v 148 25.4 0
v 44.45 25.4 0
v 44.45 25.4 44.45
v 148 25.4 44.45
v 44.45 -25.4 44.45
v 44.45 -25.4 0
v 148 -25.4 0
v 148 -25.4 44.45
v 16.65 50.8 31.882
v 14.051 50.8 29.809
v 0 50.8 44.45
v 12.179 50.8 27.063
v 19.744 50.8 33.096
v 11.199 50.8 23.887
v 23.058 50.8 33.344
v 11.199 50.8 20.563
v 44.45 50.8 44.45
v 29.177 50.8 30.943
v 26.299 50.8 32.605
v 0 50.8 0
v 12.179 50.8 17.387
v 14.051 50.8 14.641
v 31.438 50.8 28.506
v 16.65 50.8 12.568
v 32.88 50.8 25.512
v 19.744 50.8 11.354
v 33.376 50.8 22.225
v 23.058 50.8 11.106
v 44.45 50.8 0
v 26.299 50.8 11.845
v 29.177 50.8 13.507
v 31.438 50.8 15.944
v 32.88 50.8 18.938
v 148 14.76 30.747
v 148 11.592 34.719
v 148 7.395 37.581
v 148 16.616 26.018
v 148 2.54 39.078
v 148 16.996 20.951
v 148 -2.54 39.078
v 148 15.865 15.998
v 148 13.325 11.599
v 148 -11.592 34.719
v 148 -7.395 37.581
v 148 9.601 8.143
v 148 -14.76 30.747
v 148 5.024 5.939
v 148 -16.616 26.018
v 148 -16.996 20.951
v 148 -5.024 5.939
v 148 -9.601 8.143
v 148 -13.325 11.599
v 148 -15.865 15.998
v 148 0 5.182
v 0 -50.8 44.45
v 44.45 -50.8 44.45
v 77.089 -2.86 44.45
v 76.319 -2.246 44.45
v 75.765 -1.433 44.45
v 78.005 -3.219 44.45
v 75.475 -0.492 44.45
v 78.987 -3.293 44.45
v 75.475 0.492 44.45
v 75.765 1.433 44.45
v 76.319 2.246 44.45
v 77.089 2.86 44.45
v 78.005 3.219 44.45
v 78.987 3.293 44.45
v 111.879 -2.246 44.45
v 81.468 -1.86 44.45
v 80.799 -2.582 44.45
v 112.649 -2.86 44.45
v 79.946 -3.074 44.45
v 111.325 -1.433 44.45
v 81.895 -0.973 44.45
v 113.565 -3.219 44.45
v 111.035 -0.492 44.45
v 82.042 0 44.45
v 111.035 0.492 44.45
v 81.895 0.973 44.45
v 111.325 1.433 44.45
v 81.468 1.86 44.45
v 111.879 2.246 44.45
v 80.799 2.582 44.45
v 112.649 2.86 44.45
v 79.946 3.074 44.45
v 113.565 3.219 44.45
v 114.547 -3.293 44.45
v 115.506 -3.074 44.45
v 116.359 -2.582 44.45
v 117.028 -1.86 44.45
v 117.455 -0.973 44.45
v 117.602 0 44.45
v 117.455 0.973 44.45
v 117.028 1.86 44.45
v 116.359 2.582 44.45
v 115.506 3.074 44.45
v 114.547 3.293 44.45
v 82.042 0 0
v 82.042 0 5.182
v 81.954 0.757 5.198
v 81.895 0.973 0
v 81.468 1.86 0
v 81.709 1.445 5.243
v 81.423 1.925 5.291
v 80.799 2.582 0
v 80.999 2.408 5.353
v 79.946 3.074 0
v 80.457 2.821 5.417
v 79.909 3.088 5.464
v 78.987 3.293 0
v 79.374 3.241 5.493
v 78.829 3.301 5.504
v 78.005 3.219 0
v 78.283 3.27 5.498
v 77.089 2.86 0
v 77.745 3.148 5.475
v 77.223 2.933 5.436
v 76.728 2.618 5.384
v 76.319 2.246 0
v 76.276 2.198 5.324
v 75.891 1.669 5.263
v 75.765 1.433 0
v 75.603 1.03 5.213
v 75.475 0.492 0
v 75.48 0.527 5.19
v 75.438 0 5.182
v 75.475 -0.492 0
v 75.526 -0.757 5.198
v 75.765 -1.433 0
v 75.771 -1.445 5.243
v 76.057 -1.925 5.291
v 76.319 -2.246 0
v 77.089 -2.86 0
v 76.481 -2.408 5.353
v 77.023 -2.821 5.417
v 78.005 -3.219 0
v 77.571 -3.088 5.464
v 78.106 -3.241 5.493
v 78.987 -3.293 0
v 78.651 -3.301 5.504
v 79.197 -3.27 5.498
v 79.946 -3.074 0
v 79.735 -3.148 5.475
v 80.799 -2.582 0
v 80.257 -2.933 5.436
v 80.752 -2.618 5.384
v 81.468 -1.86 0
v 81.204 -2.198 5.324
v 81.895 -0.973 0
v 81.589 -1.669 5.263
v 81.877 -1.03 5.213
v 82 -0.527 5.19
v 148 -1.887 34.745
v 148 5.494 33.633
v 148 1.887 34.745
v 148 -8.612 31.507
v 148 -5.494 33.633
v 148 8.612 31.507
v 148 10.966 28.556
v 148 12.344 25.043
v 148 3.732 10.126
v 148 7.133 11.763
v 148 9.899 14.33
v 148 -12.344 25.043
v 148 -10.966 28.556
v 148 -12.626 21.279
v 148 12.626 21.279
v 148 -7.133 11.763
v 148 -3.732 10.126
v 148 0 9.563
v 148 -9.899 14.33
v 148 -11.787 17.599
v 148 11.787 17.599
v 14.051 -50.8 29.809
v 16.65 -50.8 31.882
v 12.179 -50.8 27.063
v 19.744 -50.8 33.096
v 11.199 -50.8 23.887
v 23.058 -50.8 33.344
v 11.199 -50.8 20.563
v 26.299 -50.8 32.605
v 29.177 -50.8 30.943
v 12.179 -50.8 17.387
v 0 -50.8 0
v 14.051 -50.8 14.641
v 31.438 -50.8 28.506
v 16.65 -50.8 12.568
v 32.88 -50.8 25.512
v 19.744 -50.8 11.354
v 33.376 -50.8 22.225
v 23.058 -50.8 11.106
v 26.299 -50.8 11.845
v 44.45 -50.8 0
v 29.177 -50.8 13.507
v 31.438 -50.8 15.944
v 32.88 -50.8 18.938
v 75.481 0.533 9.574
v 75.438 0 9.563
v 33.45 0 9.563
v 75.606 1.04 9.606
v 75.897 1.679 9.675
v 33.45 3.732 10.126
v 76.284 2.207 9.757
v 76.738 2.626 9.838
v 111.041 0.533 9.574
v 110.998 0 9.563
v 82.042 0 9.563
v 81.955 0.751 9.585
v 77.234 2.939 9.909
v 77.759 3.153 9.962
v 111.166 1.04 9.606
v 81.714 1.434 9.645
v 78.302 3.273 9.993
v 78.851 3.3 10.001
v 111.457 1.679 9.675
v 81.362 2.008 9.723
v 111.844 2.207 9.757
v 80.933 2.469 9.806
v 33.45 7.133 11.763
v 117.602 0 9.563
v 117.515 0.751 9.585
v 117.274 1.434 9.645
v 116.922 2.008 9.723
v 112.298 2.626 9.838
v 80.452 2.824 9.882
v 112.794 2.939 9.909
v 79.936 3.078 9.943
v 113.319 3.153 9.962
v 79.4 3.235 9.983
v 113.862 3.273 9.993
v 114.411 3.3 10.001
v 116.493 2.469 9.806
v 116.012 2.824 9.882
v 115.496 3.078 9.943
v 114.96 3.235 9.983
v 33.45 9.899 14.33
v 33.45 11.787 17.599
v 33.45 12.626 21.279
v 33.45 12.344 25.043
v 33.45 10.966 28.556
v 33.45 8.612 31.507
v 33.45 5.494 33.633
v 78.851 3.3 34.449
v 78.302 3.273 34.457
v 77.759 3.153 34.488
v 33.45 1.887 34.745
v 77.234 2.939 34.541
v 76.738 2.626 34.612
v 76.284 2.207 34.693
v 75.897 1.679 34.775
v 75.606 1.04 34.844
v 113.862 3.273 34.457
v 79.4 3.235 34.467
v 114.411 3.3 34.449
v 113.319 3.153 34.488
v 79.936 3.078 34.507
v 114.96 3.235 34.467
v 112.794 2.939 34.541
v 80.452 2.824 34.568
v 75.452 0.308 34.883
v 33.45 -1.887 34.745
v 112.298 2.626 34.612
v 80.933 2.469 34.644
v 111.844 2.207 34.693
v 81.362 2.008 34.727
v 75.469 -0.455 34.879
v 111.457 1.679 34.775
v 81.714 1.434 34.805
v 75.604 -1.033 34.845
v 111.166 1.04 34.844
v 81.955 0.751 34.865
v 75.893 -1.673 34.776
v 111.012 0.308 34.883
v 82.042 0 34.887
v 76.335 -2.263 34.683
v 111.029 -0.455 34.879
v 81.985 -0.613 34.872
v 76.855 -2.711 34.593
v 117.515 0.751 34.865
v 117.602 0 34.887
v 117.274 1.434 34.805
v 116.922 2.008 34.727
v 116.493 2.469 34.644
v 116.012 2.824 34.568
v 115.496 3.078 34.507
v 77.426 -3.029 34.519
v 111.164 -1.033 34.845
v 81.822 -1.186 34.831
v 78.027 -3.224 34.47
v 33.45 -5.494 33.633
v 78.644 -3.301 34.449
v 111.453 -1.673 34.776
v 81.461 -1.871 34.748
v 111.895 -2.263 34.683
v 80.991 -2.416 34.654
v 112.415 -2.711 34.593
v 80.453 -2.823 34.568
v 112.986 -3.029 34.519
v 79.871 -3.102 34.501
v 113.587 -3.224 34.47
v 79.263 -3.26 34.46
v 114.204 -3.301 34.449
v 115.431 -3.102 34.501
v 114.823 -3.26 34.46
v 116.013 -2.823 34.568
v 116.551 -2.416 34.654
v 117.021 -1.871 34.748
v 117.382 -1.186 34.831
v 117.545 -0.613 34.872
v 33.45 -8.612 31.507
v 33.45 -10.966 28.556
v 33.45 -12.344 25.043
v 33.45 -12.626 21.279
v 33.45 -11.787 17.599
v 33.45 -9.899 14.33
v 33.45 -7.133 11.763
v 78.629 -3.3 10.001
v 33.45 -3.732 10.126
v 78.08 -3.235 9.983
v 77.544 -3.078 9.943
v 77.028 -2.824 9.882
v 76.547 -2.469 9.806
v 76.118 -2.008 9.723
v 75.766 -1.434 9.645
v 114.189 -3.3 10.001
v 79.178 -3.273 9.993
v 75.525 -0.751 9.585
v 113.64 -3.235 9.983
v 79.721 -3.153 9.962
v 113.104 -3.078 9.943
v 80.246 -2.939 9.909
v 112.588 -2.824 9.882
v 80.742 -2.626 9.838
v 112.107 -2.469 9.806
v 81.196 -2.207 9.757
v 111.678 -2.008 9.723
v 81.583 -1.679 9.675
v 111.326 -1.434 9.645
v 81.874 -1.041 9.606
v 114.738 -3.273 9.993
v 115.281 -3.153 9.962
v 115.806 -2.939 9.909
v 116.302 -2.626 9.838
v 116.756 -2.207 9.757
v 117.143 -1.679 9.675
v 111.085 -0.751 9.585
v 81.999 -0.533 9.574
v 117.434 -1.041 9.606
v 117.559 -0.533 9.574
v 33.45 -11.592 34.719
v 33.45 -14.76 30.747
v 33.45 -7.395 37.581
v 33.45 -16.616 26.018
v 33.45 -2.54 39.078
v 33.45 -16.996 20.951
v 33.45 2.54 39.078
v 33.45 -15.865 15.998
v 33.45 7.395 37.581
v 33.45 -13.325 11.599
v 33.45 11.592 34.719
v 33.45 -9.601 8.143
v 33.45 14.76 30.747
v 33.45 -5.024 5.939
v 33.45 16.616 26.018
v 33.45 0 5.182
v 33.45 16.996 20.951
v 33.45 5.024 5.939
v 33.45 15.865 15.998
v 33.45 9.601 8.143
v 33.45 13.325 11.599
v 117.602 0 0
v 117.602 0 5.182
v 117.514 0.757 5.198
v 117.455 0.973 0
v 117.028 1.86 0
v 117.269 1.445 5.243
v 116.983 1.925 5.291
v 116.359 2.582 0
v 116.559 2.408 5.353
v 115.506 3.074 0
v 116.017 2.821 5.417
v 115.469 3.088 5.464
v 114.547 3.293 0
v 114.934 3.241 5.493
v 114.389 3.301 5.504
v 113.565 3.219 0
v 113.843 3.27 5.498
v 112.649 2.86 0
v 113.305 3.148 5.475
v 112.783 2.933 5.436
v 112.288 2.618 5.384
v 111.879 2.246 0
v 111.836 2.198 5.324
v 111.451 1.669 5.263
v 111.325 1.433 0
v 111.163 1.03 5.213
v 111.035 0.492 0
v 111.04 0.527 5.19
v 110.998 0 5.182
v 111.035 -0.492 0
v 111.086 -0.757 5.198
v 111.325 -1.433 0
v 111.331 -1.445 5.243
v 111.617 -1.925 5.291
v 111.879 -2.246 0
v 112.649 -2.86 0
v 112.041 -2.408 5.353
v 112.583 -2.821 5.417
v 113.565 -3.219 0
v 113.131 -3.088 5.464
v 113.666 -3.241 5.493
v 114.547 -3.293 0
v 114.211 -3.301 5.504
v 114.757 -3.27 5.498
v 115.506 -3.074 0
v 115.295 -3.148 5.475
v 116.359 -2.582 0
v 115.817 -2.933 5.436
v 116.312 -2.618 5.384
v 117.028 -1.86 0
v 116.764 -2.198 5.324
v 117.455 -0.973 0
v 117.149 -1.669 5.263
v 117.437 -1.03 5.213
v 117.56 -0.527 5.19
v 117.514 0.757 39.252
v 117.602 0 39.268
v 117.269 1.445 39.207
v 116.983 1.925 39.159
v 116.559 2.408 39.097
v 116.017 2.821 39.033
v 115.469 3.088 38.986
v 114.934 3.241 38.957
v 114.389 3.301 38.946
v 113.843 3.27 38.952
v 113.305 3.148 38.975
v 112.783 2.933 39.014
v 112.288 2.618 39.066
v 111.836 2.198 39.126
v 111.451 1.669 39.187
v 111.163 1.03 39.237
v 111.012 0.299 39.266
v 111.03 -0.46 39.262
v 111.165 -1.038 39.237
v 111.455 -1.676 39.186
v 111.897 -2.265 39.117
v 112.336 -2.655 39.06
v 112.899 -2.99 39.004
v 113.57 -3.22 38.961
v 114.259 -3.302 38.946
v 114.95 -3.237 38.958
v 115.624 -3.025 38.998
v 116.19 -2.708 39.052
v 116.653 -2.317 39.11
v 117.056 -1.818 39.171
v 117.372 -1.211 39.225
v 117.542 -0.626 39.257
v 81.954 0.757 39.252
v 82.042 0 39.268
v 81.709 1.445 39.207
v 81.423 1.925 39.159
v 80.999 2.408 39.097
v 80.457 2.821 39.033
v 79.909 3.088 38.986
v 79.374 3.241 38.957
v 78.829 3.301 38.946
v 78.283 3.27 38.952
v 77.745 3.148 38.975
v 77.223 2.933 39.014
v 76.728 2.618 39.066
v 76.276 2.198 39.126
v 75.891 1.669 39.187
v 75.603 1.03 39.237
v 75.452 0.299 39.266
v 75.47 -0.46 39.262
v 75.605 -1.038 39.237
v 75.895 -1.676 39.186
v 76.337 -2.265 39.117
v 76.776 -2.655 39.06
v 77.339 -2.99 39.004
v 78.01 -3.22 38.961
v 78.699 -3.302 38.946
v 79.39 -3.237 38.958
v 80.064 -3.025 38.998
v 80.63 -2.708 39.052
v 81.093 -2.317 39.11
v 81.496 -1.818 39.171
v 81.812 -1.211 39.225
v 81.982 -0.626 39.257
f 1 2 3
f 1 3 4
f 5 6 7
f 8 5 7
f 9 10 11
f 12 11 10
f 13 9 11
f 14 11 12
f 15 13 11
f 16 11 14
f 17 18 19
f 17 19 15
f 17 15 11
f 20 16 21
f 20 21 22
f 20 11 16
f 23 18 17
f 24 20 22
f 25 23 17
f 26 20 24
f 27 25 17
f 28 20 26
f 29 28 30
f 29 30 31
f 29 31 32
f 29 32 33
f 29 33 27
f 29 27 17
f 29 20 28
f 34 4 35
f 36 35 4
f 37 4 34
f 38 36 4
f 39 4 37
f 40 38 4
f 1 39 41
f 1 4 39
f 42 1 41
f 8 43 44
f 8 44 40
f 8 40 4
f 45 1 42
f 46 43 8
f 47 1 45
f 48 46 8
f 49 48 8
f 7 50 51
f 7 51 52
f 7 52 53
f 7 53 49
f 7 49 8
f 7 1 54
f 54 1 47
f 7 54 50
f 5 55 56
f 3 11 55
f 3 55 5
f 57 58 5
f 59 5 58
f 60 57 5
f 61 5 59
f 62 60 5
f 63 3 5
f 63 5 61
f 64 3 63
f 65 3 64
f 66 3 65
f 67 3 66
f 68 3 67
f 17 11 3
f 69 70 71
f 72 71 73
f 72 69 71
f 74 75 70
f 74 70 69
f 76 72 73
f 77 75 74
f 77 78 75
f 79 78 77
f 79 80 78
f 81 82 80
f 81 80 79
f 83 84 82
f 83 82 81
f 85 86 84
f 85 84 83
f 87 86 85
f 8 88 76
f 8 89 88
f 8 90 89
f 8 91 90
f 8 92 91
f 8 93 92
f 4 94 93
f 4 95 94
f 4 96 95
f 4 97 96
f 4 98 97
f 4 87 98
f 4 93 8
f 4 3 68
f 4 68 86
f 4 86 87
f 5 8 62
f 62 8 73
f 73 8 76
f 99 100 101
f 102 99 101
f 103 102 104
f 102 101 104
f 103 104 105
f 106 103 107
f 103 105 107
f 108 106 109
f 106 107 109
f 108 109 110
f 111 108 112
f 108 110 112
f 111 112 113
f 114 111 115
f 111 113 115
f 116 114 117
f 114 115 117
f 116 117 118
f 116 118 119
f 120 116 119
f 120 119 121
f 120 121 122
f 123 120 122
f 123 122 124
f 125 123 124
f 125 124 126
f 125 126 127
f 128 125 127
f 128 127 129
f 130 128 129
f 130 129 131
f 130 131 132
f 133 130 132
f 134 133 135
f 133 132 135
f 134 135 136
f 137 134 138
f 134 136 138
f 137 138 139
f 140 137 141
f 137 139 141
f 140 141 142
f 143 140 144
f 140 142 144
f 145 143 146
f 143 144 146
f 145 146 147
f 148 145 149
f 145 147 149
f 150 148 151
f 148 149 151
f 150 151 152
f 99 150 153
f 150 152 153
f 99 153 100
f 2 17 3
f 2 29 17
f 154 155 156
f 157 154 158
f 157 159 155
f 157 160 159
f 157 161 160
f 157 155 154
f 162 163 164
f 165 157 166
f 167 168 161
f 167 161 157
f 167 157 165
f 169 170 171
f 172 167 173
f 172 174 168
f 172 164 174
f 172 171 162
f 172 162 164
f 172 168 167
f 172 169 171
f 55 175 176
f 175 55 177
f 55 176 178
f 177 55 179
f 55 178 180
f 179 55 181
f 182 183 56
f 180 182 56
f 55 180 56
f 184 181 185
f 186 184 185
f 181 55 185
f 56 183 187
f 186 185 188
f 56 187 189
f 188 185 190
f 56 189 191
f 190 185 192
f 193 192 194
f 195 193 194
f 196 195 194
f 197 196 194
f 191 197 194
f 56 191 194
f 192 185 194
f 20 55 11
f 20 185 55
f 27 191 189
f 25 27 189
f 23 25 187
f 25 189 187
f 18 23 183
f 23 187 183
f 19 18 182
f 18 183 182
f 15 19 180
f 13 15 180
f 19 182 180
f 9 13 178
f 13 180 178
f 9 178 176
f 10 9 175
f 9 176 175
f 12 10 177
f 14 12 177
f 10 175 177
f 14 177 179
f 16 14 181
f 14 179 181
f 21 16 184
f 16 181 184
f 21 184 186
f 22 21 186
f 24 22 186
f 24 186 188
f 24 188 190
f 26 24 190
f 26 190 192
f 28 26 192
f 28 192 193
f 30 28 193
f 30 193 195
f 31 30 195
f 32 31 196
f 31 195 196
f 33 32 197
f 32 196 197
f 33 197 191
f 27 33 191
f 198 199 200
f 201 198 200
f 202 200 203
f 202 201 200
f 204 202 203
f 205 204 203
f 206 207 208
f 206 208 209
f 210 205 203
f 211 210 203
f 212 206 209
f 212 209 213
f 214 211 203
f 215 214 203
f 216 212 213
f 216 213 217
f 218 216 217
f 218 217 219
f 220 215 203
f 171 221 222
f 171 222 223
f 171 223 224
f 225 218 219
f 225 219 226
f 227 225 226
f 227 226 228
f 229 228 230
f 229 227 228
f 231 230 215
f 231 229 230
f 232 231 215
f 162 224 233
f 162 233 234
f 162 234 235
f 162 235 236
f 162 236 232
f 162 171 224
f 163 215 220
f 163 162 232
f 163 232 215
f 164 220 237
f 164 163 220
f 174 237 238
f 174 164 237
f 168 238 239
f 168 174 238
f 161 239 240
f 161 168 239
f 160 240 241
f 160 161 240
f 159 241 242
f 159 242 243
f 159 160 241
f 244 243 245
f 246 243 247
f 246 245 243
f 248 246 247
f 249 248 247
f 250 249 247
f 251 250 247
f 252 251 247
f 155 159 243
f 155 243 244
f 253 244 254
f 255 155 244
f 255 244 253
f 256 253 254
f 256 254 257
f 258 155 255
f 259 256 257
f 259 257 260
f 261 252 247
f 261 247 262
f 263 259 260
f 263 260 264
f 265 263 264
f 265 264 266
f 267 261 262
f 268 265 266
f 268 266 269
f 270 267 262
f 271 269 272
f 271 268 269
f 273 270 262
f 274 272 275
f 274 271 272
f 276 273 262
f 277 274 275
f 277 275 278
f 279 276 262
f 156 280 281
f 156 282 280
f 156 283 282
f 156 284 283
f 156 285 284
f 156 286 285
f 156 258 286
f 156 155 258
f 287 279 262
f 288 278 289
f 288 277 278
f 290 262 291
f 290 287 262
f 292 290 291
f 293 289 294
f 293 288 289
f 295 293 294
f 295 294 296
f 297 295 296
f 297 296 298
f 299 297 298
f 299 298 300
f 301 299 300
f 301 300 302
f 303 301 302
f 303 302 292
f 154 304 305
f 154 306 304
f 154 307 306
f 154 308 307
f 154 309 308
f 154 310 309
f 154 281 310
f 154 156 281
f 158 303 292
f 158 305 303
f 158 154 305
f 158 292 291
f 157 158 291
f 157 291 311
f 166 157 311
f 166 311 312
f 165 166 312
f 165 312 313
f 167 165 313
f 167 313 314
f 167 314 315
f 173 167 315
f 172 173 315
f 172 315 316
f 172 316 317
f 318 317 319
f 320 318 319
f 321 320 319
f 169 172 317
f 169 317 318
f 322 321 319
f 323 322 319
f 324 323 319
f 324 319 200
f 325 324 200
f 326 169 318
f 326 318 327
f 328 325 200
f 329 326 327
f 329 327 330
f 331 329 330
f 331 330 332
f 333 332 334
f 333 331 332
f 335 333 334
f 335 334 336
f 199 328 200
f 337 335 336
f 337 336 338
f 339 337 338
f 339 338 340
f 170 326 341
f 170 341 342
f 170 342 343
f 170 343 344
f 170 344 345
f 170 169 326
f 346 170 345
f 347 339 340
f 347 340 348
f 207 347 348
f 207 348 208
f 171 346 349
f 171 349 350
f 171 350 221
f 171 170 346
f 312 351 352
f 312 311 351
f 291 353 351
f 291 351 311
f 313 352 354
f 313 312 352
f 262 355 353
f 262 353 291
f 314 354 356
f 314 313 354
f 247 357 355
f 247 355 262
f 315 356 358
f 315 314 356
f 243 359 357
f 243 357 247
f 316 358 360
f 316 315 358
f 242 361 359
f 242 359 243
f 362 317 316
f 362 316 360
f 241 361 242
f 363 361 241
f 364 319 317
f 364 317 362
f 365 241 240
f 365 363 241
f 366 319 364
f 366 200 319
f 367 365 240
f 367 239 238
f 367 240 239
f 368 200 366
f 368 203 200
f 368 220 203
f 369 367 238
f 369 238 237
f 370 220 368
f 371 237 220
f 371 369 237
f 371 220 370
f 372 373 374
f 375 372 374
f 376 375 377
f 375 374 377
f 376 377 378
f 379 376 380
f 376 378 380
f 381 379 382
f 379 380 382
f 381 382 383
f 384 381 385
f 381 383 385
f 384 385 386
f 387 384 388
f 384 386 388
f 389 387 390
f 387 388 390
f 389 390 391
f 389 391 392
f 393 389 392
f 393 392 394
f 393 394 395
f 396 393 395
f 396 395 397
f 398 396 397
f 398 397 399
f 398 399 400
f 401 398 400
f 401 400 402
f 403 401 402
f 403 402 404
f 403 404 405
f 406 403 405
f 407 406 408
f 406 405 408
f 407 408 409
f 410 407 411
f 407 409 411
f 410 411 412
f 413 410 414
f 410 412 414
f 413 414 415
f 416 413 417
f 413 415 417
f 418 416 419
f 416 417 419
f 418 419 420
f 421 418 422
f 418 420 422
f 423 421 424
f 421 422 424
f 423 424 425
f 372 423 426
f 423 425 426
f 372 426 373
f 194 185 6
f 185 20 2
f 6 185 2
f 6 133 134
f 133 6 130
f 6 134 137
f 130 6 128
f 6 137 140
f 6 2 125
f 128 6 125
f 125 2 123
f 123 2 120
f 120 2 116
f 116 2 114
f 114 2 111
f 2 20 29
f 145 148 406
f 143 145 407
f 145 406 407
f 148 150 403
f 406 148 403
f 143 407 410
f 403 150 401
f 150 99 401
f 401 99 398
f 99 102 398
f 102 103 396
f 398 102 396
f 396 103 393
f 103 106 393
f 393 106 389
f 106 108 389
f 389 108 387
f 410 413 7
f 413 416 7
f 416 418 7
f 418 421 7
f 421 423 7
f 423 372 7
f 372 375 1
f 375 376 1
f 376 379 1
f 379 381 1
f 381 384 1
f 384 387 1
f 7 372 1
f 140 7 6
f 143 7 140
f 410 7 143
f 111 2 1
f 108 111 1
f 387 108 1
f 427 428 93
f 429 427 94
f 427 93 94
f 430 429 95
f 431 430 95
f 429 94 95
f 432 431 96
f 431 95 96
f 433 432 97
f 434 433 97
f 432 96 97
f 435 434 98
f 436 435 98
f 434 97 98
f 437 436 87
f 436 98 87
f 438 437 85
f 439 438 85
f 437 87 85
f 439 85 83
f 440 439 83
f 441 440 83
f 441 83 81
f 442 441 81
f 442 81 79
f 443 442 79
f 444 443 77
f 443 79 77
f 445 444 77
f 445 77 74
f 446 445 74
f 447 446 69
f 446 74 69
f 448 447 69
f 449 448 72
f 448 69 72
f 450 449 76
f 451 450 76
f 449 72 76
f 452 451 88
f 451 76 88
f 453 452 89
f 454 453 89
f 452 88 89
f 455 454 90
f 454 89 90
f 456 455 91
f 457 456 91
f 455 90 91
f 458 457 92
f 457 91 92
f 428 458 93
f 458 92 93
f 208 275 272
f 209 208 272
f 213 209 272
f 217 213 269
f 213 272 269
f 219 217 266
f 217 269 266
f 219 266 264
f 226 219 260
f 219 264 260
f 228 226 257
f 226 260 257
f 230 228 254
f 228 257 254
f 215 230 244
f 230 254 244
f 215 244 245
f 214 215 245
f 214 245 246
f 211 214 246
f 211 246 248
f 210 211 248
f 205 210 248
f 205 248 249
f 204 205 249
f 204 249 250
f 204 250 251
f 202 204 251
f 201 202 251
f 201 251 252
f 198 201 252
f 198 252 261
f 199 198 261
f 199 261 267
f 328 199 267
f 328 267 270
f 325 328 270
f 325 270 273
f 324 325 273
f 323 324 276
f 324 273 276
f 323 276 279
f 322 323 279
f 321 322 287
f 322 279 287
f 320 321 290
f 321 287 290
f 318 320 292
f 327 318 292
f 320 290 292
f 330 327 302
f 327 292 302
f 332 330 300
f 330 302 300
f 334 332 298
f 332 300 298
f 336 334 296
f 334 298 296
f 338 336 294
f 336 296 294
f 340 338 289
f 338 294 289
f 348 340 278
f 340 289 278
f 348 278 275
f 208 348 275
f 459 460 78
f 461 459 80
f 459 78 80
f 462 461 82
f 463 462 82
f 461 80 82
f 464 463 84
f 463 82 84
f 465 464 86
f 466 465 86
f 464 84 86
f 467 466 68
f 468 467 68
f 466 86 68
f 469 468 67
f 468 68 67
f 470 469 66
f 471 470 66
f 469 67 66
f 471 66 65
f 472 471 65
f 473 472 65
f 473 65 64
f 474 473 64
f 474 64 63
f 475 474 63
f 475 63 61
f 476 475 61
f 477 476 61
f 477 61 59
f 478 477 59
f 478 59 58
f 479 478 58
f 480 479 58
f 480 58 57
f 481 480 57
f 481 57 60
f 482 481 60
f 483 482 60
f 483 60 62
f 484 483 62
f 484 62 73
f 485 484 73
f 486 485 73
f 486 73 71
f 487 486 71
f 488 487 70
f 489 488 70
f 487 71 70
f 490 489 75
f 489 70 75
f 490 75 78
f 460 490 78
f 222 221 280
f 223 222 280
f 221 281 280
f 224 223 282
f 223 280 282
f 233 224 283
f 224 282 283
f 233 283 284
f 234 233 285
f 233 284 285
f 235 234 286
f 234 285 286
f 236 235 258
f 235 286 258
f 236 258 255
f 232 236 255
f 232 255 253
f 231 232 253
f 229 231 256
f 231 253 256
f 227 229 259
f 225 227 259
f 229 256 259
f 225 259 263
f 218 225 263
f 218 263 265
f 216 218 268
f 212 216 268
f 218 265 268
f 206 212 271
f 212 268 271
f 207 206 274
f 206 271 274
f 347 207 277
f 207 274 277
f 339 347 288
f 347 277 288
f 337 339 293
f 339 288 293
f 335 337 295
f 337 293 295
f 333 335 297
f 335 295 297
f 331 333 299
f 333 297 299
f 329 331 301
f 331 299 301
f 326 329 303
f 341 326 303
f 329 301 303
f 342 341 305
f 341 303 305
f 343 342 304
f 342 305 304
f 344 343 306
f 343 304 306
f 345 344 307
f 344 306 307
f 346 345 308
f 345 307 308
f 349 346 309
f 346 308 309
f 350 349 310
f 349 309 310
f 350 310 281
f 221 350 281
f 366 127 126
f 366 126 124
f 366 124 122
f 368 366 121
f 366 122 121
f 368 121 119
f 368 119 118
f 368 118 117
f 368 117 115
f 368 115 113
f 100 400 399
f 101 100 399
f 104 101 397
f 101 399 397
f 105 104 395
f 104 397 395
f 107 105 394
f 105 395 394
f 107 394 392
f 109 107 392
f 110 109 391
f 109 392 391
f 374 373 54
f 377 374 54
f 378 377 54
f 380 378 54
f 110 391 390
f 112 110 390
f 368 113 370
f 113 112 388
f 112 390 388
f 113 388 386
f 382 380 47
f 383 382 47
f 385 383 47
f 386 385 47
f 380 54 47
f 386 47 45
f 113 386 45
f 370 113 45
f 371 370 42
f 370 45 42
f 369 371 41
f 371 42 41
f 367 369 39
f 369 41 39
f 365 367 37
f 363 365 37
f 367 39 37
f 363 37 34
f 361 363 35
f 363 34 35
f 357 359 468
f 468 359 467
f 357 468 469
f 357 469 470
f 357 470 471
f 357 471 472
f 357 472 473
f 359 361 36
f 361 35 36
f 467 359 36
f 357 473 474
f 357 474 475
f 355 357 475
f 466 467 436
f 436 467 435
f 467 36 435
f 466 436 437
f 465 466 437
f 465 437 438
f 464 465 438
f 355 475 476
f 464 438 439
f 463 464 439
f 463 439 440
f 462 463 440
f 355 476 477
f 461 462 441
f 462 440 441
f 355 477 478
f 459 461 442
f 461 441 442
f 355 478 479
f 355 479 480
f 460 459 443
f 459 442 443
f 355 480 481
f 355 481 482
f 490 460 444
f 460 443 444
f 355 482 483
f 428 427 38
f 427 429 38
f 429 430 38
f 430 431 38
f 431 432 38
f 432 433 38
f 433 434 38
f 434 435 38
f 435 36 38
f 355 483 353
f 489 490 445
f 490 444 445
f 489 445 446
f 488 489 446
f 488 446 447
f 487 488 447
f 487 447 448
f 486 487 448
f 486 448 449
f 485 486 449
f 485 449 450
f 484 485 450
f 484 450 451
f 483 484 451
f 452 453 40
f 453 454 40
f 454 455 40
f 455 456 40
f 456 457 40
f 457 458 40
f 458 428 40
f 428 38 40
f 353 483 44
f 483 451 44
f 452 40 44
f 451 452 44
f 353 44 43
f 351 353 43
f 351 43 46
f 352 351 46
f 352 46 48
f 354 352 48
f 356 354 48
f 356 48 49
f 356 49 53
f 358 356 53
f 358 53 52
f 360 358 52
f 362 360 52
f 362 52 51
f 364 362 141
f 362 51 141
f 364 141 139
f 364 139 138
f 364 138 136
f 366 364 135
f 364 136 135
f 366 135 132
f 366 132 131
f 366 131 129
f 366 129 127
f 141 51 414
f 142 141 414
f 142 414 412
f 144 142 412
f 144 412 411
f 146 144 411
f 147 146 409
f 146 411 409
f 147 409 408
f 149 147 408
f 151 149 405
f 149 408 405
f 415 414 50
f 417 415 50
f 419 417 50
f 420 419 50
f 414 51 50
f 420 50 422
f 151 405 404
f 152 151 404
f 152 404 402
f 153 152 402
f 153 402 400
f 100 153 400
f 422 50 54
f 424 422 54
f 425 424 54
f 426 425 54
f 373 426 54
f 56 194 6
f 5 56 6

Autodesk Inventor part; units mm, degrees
ref_plane "YZ Plane" through (0, 0, 0) normal (1, 0, 0) x (0, 1, 0)
ref_plane "XZ Plane" through (0, 0, 0) normal (0, 1, 0) x (-1, 0, 0)
sketch "Base for Part" plane through (0, 0, 0) normal (0, 0, 1) x (1, 0, 0)
  line L0 (0, 0) -> (148, 0) construction
  line L1 (0, 0) -> (0, 50.8)
  line L2 (0, 50.8) -> (44.45, 50.8)
  line L3 (148, -29.2) -> (148, 0)
  line L4 (44.45, 50.8) -> (44.45, 25.4)
  line L5 (44.45, 25.4) -> (148, 25.4)
  line L6 (148, 25.4) -> (148, 0)
  line L7 (0, 0) -> (0, -50.8)
  line L8 (0, -50.8) -> (44.45, -50.8)
  line L9 (44.45, -50.8) -> (44.45, -25.4)
  line L10 (44.45, -25.4) -> (148, -25.4)
  line L11 (148, -25.4) -> (148, 0)
  dimension "d0" = 148
  dimension "d1" = 50.8
  dimension "d2" = 44.45
  dimension "d3" = 25.4
extrude "Extrusion of Base" add sketch "Base for Part" along normal blind 44.45
sketch "Sketch for 1 inch PVC" plane through (148, -25.4, 0) normal (1, 0, 0) x (0, 0, -1)
  line L0 (0, 50.8) -> (-44.45, 50.8) projected
  line L1 (-44.45, 0) -> (-44.45, 50.8) projected
  line L2 (0, 0) -> (-44.45, 0) projected
  line L3 (-44.45, 25.4) -> (0, 25.4) construction
  line L4 (-22.225, 50.8) -> (-22.225, 0) construction
  circle A0 centre (-22.225, 25.4) radius 12.6619
  circle A1 centre (-22.225, 25.4) radius 17.0434
  dimension "d6" = 34.0868
  dimension "d7" = 25.3238
extrude "Extrusion for 1 inch PVC" cut sketch "Sketch for 1 inch PVC" against normal blind 114.55
sketch "Sketch of Base Hole" plane through (0, -50.8, 0) normal (0, -1, 0) x (1, 0, 0)
  line L0 (44.45, 0) -> (0, 0) projected
  line L1 (44.45, 0) -> (44.45, 44.45) projected
  line L2 (0, 44.45) -> (44.45, 44.45) projected
  line L3 (0, 0) -> (0, 44.45) projected
  line L4 (0, 22.225) -> (44.45, 22.225) construction
  line L5 (22.225, 44.45) -> (22.225, 0) construction
  circle A0 centre (22.225, 22.225) radius 11.1506
  dimension "d10" = 22.3012
extrude "Extrusion3" cut sketch "Sketch of Base Hole" against normal through all contours A0
ref_plane "Work Plane1" through (0, 0, 44.45) normal (0, 0, 1) x (1, 0, 0)
sketch "Sketch9" plane through (0, 0, 44.45) normal (0, 0, 1) x (1, 0, 0)
  circle A0 centre (78.74, 0) radius 3.302
  circle A1 centre (114.3, 0) radius 3.302
  line L0 (149.86, 19.05) -> (149.86, -19.05) projected
  point P0 (0, 0)
  dimension "d39" = 6.604
  dimension "d42" = 35.56
  dimension "d43" = 71.12
extrude "Extrusion6" cut sketch "Sketch9" against normal through all
properties part number "WagonHandleV01"
